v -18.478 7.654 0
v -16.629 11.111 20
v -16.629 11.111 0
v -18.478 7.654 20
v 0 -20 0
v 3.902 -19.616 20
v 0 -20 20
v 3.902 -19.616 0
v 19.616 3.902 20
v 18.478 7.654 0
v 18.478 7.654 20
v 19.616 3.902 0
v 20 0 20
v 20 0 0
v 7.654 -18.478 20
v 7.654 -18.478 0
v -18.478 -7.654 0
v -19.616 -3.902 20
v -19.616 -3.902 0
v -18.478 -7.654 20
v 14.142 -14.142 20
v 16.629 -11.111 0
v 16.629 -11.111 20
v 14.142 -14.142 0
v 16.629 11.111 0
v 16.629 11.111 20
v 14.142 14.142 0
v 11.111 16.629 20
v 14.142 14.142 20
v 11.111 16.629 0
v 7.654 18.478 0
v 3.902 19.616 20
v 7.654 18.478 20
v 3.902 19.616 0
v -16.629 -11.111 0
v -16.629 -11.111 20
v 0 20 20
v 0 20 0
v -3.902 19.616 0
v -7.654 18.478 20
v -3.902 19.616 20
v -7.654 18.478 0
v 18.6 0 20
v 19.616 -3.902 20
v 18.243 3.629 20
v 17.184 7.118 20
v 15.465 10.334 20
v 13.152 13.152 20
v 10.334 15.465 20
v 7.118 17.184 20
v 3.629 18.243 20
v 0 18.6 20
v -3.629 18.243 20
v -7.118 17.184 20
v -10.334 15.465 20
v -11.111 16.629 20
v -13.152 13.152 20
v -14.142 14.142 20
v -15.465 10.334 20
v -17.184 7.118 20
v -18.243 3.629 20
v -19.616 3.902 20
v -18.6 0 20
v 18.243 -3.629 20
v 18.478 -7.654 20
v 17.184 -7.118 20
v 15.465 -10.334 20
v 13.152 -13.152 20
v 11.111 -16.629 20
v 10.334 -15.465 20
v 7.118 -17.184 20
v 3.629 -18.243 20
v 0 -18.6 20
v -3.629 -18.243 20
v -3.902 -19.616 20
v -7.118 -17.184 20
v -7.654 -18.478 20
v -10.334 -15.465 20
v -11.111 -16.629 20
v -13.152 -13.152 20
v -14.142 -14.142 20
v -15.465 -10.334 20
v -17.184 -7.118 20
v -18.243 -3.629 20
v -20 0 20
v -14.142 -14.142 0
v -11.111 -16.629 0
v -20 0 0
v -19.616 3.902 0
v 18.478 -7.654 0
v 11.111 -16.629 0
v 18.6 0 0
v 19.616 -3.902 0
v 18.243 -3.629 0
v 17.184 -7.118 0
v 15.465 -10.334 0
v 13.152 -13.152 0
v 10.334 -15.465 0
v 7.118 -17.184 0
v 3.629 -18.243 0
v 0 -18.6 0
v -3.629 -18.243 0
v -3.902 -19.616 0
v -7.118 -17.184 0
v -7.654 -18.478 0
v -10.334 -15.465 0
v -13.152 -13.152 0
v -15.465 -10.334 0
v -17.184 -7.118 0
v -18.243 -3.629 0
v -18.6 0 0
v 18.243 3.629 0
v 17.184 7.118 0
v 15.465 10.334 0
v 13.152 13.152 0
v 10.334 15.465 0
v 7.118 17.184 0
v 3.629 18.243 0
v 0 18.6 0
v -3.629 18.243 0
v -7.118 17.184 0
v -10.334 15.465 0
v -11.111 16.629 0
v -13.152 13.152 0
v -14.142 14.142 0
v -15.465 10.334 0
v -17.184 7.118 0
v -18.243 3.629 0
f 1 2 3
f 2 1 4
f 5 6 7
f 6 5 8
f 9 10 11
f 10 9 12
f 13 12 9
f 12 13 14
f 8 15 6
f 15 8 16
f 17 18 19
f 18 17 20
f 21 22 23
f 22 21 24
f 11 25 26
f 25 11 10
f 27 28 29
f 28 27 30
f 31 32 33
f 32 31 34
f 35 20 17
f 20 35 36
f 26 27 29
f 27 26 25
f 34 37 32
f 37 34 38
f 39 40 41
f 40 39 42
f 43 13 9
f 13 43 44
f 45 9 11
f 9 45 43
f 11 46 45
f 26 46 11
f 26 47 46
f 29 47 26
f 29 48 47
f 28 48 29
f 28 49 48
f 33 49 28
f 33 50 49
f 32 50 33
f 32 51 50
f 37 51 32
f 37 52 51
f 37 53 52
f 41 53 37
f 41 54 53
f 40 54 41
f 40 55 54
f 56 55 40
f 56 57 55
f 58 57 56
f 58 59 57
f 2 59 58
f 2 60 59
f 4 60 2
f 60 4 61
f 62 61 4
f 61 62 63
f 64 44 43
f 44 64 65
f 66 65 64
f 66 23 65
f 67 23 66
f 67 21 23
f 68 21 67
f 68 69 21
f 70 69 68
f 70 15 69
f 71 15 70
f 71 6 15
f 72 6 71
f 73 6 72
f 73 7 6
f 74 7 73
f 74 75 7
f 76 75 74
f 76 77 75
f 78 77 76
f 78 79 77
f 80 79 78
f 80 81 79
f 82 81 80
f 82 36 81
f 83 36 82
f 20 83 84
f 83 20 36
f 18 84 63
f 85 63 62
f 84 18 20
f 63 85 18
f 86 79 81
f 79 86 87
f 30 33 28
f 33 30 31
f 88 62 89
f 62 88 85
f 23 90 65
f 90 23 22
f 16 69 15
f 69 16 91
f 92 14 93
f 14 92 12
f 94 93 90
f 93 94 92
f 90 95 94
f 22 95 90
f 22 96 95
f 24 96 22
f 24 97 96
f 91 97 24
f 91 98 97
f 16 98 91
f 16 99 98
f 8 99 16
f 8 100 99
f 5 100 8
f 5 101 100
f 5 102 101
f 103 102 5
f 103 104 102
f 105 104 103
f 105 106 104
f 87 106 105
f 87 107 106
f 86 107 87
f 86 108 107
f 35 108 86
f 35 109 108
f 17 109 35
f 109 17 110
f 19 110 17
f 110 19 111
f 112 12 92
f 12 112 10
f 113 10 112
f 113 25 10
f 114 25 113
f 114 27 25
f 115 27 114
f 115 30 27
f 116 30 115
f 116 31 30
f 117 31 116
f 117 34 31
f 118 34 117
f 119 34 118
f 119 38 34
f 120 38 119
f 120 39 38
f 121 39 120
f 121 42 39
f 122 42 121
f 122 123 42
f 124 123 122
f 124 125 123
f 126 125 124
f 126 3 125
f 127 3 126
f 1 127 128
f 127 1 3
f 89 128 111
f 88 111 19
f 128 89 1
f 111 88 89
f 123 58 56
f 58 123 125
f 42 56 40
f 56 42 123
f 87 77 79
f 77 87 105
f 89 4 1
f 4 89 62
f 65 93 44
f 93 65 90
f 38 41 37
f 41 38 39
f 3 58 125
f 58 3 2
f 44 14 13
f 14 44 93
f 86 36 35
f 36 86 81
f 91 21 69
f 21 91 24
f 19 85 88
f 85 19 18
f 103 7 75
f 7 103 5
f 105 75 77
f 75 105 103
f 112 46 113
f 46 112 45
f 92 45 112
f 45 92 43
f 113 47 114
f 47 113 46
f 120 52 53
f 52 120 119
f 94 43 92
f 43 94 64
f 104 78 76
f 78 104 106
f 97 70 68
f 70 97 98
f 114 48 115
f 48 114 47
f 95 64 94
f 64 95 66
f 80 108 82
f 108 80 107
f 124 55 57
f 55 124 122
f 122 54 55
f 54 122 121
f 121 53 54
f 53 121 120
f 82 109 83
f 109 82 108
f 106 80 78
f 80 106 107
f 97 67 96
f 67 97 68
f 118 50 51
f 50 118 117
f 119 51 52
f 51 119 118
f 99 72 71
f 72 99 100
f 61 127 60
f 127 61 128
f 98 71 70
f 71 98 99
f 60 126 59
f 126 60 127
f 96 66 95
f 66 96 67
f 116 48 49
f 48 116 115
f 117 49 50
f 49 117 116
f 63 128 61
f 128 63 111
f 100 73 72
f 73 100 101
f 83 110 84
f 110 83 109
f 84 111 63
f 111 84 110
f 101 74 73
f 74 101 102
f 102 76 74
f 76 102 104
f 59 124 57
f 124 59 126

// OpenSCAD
$fn = 32;

// ----------------------------------------------------------------------
// Thin tube: 1.4 mm wall
// ----------------------------------------------------------------------

// --- parameters (mm) ---
tube_od = 40;             // outer diameter
tube_h = 20;              // height, Z
wall = 1.4;               // wall thickness

difference() {
  cylinder(h = tube_h, d = tube_od);
  translate([0, 0, -1]) cylinder(h = tube_h + 2, d = tube_od - 2 * wall);
}
